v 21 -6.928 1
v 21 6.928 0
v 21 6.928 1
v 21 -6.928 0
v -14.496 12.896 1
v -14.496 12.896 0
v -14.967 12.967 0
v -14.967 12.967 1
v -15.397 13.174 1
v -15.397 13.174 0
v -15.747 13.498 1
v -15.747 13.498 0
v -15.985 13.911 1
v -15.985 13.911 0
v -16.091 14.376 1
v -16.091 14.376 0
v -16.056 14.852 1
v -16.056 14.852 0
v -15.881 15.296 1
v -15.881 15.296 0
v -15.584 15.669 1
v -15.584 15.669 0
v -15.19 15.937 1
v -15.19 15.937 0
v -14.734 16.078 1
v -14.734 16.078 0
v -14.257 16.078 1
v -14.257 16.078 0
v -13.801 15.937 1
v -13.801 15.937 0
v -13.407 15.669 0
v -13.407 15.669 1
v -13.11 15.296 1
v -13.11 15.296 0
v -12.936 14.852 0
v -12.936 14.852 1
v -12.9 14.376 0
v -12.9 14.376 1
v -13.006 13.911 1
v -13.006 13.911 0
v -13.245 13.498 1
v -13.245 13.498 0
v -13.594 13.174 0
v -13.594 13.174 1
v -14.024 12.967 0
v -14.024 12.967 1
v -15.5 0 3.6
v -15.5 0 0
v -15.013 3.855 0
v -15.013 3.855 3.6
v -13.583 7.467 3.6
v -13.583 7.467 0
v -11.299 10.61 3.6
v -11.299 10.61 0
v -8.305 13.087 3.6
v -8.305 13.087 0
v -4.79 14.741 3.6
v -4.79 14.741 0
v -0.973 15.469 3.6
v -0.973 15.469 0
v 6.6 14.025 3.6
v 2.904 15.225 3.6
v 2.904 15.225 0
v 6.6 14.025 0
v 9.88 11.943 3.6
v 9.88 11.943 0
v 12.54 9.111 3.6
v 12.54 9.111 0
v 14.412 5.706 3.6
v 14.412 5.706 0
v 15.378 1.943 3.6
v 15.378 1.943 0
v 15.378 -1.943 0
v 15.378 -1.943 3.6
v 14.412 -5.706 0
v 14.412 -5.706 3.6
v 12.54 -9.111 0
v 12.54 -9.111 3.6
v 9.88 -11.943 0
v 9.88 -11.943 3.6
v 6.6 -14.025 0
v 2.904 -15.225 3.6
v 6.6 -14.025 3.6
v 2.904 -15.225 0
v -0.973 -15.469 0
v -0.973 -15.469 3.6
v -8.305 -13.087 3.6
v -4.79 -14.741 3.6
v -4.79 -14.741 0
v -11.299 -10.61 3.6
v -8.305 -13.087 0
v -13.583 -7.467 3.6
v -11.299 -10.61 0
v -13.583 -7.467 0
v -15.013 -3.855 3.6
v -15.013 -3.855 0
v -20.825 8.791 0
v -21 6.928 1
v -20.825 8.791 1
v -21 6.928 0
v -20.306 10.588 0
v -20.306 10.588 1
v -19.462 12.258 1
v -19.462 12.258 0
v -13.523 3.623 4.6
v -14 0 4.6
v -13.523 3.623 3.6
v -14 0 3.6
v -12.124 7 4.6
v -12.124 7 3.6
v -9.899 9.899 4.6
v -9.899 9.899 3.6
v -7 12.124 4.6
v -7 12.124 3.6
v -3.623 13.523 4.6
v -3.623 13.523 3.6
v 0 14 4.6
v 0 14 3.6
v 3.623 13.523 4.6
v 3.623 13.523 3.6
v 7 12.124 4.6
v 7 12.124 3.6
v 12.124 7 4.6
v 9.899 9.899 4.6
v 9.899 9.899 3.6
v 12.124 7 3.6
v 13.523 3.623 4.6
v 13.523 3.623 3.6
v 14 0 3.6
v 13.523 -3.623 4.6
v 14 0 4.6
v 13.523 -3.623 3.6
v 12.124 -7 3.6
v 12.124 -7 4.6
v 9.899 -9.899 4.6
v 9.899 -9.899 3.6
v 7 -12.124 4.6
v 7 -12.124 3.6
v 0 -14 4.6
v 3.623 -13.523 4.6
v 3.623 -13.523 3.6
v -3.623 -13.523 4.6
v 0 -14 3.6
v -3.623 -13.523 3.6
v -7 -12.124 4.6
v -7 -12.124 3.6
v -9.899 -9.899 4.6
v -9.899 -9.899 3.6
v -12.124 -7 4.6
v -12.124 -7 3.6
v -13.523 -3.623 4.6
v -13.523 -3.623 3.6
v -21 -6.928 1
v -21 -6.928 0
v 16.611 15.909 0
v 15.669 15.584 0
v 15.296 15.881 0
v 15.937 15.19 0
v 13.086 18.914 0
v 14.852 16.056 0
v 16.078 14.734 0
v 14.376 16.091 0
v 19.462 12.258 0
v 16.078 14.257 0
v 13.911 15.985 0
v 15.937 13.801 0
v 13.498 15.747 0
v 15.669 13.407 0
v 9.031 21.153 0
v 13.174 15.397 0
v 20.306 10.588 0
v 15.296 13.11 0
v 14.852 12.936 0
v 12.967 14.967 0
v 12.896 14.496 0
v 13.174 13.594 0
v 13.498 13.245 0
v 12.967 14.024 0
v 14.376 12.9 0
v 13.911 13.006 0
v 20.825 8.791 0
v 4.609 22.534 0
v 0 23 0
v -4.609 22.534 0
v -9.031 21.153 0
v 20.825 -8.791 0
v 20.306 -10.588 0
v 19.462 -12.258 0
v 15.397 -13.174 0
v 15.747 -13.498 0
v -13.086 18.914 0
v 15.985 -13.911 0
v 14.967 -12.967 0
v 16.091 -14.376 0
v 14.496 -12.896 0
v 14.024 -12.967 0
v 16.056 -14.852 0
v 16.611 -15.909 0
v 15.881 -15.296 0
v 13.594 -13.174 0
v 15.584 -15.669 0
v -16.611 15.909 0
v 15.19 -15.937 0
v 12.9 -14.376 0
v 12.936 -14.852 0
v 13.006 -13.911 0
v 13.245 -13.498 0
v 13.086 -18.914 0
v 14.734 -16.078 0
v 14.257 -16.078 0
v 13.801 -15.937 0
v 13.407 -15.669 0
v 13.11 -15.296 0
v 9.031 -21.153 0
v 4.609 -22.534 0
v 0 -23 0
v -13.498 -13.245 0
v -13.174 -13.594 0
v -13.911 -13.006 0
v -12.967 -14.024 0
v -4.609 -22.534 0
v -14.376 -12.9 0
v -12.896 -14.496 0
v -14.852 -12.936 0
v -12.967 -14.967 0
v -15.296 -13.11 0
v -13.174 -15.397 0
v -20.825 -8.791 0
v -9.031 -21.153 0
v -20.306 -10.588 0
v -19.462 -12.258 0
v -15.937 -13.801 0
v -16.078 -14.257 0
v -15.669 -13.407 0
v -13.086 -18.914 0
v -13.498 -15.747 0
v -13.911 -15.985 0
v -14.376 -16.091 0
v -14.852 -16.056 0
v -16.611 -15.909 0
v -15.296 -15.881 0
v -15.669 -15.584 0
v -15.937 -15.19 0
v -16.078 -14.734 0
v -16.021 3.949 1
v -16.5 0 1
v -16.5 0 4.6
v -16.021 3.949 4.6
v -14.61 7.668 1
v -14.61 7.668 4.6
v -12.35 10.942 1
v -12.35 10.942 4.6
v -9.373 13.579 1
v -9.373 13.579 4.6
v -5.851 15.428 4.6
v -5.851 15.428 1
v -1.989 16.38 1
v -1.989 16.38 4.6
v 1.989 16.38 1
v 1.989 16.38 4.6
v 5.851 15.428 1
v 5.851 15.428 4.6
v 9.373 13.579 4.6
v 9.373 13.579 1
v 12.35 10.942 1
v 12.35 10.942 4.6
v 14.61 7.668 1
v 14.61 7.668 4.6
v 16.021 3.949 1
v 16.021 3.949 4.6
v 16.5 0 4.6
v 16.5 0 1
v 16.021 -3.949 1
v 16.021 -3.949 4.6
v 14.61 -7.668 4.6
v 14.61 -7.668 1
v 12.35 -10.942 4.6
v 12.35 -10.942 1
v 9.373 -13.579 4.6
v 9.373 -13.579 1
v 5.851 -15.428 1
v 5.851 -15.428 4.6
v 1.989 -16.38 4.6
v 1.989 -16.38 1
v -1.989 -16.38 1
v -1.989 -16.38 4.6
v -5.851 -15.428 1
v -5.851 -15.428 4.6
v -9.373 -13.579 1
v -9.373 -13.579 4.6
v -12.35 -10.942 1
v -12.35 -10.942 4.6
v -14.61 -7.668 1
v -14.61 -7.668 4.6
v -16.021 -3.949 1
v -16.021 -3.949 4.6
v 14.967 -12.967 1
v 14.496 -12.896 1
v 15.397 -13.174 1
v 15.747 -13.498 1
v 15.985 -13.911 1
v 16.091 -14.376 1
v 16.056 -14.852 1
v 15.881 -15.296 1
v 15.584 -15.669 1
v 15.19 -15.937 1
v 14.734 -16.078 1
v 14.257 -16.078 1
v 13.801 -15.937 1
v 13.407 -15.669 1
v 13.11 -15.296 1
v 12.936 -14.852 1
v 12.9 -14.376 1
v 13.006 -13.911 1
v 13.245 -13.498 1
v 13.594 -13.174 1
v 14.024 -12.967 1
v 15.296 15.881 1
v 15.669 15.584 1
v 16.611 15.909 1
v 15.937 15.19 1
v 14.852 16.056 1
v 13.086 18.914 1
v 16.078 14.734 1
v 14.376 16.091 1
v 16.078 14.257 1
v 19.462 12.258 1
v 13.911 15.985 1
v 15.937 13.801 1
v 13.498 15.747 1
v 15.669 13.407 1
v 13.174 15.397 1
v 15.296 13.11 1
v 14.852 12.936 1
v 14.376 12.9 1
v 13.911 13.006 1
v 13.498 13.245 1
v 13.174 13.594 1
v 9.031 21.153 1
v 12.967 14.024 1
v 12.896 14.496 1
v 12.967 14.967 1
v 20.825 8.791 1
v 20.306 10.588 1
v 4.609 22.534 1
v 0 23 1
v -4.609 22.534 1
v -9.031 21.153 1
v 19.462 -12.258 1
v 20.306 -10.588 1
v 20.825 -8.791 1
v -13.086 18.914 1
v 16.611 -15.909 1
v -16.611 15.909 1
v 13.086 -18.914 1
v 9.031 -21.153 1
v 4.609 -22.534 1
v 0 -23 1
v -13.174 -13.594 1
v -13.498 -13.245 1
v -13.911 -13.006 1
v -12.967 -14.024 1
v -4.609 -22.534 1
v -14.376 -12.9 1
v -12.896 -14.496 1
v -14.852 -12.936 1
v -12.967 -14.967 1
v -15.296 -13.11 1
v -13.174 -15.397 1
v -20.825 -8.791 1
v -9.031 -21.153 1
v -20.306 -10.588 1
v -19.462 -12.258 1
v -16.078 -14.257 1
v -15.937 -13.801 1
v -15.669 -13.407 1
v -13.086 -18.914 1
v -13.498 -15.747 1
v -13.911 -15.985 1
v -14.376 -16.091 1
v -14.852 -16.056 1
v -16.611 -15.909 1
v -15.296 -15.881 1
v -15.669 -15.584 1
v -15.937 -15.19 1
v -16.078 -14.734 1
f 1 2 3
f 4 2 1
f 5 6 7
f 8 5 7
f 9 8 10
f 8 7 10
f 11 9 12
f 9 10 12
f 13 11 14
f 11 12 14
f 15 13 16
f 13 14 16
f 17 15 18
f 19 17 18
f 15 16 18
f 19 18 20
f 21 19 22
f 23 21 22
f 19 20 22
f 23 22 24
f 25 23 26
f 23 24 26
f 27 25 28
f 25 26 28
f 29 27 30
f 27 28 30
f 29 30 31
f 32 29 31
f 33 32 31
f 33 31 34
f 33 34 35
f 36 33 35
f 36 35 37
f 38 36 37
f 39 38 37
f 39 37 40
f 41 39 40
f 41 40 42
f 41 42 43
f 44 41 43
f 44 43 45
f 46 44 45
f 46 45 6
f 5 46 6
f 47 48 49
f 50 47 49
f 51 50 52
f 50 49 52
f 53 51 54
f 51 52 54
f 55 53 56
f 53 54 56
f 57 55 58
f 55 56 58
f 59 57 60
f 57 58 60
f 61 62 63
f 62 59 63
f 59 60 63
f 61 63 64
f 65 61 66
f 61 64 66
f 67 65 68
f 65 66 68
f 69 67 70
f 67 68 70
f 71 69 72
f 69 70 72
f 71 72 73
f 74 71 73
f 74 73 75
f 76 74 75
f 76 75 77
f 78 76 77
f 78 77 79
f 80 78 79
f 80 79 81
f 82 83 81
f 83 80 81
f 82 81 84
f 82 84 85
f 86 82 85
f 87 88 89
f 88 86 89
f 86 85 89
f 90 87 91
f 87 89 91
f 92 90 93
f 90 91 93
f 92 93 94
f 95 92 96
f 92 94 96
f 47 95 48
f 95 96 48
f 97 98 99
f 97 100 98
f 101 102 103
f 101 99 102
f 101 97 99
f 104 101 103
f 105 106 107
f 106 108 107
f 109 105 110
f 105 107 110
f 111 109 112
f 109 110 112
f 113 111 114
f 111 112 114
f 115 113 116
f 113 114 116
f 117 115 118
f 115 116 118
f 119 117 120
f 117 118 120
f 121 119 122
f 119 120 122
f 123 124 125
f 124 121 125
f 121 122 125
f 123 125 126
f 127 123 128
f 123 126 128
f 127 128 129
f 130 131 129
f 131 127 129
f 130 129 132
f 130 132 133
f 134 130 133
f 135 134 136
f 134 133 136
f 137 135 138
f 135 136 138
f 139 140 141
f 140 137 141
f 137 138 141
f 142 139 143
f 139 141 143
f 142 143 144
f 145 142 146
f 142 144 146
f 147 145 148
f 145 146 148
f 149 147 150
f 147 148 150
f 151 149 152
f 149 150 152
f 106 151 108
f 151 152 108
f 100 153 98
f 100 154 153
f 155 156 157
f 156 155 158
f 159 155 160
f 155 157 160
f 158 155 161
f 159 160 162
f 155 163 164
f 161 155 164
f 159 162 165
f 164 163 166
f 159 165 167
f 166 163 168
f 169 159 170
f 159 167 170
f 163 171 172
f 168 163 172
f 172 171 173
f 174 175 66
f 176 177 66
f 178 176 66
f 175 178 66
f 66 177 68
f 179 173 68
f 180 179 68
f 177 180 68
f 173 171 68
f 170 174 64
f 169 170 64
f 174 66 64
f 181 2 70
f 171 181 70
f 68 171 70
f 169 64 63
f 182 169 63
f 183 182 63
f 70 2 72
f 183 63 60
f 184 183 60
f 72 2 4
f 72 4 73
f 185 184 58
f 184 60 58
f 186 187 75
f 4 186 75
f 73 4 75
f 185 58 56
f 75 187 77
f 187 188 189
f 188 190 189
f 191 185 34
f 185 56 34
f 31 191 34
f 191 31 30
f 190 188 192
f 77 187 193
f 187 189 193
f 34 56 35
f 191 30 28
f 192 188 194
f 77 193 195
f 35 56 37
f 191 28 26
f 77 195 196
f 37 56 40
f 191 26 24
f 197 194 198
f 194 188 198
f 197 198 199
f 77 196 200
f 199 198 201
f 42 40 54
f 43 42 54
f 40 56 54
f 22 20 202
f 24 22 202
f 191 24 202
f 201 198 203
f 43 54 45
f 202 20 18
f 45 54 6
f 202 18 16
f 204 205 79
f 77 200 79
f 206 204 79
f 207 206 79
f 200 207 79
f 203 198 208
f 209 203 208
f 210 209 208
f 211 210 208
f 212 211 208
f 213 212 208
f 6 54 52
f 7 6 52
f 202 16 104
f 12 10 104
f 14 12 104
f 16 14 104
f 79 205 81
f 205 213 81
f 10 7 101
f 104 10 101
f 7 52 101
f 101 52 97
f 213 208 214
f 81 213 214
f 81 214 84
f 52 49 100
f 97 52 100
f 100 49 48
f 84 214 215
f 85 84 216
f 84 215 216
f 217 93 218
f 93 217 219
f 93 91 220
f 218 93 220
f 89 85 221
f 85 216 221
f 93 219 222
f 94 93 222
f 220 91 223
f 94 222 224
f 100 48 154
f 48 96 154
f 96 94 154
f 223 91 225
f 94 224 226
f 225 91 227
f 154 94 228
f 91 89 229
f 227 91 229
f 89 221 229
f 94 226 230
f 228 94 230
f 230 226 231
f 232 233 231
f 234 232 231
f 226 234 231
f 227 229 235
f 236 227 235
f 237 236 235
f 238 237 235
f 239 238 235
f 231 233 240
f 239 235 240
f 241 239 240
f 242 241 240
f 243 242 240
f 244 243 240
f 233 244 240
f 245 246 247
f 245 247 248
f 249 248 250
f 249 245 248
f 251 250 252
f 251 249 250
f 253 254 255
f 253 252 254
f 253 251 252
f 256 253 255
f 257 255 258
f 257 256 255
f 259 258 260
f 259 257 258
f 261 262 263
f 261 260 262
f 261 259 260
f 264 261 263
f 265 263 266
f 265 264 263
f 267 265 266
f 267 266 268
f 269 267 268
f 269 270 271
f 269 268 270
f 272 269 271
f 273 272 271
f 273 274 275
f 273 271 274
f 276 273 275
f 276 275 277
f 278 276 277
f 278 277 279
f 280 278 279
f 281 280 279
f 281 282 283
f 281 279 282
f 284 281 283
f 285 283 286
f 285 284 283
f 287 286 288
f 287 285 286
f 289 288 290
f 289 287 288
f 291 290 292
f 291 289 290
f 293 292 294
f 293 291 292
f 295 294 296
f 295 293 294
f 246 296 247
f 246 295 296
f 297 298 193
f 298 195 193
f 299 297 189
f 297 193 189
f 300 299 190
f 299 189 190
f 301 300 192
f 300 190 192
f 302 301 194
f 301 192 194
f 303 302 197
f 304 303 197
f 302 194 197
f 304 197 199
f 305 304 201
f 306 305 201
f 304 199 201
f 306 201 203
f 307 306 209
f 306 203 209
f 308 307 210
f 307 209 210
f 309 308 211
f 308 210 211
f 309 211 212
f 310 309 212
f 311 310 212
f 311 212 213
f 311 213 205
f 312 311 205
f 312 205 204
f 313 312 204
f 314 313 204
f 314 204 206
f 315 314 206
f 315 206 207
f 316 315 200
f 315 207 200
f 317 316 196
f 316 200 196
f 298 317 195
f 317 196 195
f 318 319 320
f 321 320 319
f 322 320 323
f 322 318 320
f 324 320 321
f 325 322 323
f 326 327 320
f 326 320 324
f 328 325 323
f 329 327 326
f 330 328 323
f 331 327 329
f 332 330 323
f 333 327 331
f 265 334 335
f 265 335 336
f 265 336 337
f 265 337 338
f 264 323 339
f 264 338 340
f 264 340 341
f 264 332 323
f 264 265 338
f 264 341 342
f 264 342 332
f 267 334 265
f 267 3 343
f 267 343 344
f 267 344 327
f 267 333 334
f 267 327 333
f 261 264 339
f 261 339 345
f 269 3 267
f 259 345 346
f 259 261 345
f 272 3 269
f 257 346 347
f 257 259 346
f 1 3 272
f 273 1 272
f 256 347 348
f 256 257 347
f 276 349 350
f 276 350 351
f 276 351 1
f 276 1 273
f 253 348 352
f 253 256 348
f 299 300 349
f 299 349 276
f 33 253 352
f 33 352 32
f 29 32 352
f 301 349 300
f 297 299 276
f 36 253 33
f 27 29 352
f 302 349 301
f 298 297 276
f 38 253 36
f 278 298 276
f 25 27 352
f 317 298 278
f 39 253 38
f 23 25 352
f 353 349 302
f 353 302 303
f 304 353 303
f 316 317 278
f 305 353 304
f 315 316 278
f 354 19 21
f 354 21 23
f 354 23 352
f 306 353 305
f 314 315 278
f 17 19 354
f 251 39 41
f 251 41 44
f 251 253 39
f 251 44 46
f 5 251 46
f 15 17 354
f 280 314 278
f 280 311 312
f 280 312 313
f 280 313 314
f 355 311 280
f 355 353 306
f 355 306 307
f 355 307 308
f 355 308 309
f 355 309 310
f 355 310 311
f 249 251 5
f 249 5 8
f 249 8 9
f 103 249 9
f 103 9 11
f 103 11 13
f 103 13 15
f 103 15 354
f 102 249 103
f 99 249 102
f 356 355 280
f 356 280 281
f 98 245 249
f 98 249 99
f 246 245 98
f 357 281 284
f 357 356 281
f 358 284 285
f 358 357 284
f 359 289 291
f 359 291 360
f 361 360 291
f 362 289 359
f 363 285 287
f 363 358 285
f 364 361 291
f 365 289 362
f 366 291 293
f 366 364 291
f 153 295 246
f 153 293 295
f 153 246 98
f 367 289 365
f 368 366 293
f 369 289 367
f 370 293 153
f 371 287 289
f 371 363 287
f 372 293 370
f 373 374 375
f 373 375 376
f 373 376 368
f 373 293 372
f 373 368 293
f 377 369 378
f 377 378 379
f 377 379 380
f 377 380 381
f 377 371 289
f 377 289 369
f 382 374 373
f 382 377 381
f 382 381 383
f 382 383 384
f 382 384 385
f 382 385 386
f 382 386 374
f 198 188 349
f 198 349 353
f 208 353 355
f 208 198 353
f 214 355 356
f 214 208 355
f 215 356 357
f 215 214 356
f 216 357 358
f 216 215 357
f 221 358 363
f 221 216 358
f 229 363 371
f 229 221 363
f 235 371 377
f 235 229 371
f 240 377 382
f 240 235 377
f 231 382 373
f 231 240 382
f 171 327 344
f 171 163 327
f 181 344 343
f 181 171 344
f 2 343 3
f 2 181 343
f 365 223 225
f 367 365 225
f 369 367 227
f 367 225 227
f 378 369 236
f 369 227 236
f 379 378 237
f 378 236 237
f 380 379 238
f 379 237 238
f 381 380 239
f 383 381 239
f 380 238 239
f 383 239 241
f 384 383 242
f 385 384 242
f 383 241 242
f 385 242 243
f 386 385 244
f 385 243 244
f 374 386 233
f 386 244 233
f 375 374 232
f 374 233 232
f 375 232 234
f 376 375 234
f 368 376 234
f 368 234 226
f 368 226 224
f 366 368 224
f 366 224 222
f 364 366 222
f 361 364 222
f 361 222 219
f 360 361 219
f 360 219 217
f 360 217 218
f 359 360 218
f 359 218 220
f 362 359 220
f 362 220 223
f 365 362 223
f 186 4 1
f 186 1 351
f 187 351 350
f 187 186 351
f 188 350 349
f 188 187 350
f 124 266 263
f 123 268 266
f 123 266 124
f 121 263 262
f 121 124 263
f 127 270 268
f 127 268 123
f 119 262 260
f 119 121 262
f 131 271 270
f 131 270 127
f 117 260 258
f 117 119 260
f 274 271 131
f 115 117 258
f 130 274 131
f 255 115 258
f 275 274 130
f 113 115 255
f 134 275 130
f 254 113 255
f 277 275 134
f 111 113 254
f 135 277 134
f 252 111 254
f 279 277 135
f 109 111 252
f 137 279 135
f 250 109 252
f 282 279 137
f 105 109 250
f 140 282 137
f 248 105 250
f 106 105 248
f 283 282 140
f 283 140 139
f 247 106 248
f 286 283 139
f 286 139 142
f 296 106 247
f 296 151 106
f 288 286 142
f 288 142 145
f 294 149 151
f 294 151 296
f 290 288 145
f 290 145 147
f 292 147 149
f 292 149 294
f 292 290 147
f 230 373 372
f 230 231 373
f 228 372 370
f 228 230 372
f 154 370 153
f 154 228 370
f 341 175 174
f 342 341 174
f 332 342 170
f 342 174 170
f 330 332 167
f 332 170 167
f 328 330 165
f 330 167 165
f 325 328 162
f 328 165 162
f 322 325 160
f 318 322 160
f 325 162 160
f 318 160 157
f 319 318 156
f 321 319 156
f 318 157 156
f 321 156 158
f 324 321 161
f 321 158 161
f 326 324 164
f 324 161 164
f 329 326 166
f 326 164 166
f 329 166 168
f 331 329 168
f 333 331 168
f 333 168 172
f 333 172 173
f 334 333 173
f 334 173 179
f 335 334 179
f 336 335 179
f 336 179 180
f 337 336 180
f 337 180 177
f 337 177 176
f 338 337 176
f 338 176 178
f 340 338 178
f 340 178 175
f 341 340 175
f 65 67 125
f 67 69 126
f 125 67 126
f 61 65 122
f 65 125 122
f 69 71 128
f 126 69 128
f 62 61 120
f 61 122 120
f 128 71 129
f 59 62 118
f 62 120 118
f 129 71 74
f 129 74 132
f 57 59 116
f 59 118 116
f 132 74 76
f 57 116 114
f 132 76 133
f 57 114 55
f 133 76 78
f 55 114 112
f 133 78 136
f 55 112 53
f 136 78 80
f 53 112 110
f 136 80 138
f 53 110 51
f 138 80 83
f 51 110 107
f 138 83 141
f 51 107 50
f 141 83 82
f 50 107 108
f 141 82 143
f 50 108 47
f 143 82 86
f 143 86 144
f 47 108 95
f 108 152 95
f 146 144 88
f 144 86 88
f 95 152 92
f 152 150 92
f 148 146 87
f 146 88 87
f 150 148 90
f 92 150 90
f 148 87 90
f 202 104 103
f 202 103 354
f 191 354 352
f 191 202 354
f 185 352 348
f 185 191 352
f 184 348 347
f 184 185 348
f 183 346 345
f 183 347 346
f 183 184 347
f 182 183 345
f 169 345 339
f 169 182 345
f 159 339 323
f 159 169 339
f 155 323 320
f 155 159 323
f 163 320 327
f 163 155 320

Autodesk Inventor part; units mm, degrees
ref_plane "YZ Plane" through (0, 0, 0) normal (1, 0, 0) x (0, 1, 0)
ref_plane "XZ Plane" through (0, 0, 0) normal (0, 1, 0) x (-1, 0, 0)
ref_plane "XY Plane" through (0, 0, 0) normal (0, 0, 1) x (1, 0, 0)
sketch "Sketch1" plane through (0, 0, 0) normal (0, 1, 0) x (-1, 0, 0)
  line L0 (0, 0) -> (0, 4.6)
  line L1 (0, 4.6) -> (14, 4.6) construction
  line L2 (14, 4.6) -> (16.5, 4.6)
  line L3 (16.5, 4.6) -> (16.5, 1)
  line L4 (16.5, 1) -> (23, 1)
  line L5 (23, 1) -> (23, 0)
  line L6 (23, 0) -> (15.5, 0)
  line L7 (15.5, 0) -> (0, 0) construction
  line L8 (14, 4.6) -> (14, 3.6)
  line L9 (14, 3.6) -> (15.5, 3.6)
  line L10 (15.5, 3.6) -> (15.5, 0)
  dimension "d0" = 46
  dimension "d2" = 31
  dimension "d3" = 28
  dimension "d4" = 3.6
  dimension "d5" = 1
  dimension "d6" = 1
  dimension "d7" = 1
revolve "Revolution1" add sketch "Sketch1" angle 360 about axis through (0, 0, 0) along (0, 0, 1)
sketch "Sketch2" plane through (0, 0, 1) normal (0, 0, 1) x (1, 0, 0)
  circle A0 centre (0, 0) radius 20.5 construction
  line L0 (-14.4957, 14.4957) -> (0, 0) construction
  line L1 (0, 0) -> (-12.5096, 0) construction
  dimension "d9" = 41
  dimension "d20" = 45
hole "Hole1" at (-14.4957, 14.4957, 1) direction (0, 0, -1) diameter 3.2 end through all
pattern_circular "Circular Pattern1" count 4 over 360 about axis through (0, 0, 0.5) along (0, 0, 1) of "Hole1"
sketch "Sketch3" plane through (0, 0, 0) normal (0, 0, 1) x (1, 0, 0)
  line L0 (-28.4447, -15.8605) -> (-21, -15.8605)
  line L1 (-21, -15.8605) -> (-21, 15.8605)
  line L2 (-21, 15.8605) -> (-28.4447, 15.8605)
  line L3 (-28.4447, 15.8605) -> (-28.4447, -15.8605)
  point P0 (0, 0)
  point P1 (-28.4447, 0)
  dimension "d21" = 21
extrude "Extrusion1" cut sketch "Sketch3" along normal through all
fillet "Fillet1" radius 10 2 edges at (-21, -9.3808, 0.5) (-21, 9.3808, 0.5)
mirror "Mirror1" about plane through (0, 0, 0) normal (1, 0, 0) of "Extrusion1", "Fillet1"
equation "\"d5\" = wall_thickness"
equation "\"d6\" = wall_thickness"
equation "\"d7\" = wall_thickness"
equation "\"wall_thickness\" = 1"
properties part number "quartz-disk-window-holder" material "Stainless Steel"
